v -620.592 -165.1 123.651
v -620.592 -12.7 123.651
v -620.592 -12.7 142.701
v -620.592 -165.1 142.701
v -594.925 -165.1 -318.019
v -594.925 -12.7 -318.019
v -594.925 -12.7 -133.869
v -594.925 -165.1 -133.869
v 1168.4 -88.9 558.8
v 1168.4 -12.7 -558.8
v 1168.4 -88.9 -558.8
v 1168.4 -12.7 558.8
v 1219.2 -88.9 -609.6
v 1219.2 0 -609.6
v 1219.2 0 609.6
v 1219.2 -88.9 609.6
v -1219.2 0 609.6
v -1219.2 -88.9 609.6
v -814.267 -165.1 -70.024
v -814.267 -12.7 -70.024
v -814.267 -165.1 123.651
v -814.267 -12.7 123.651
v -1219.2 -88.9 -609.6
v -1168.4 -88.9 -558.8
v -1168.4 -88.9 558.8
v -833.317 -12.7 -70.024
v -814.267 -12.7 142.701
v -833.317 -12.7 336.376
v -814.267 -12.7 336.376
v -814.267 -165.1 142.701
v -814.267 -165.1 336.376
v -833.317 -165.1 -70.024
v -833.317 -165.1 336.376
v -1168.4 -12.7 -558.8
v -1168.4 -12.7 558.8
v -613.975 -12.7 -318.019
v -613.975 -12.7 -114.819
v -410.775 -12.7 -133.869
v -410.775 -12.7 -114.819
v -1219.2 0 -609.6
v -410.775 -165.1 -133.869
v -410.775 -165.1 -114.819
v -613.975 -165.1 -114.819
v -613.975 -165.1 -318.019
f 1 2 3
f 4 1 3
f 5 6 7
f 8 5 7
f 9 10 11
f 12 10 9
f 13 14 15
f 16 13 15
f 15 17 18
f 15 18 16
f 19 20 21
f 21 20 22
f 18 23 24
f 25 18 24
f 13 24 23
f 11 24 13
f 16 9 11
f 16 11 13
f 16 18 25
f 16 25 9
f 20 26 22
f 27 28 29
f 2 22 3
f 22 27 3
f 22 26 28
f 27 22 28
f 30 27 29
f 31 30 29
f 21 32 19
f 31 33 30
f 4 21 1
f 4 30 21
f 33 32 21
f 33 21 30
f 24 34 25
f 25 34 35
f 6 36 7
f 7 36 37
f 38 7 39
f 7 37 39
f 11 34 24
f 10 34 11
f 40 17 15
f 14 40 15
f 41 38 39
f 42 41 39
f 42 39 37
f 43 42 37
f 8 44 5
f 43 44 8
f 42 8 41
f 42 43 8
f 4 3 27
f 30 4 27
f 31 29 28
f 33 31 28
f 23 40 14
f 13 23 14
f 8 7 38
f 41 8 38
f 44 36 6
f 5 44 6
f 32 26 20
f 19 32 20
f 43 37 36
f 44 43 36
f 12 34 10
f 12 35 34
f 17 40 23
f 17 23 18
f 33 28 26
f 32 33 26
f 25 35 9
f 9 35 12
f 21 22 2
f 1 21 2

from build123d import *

# Parameters (mm, degrees)
F0_W     = 2438.4
F0_H     = 1219.2
F0_W_2   = 2336.8
F0_H_2   = 1117.6
F1_DEPTH = 12.7
F2_DEPTH = 88.9
F4_DEPTH = 152.4
F6_DEPTH = 152.4


with BuildPart() as f1:
    # F0 (on Front) → F1 (new body)
    with BuildSketch(Plane.XZ):
        Rectangle(F0_W, F0_H)
        Rectangle(F0_W_2, F0_H_2, mode=Mode.SUBTRACT)
        Rectangle(F0_W_2, F0_H_2)
    extrude(amount=F1_DEPTH)

    # F0 (on Front) → F2 (join)
    with BuildSketch(Plane.XZ):
        Rectangle(F0_W, F0_H)
        Rectangle(F0_W_2, F0_H_2, mode=Mode.SUBTRACT)
    extrude(amount=F2_DEPTH)


with BuildPart() as f4:
    # F3 (on face) → F4 (new body)
    with BuildSketch(Plane.XZ.offset(12.7)):
        Polygon((-814.2674711327, 336.3761521408), (-833.3174711327, 336.3761521408), (-833.3174711327, 142.7011521408), (-833.3174711327, 123.6511521408), (-833.3174711327, -70.0238478592), (-814.2674711327, -70.0238478592), (-814.2674711327, 123.6511521408), (-620.5924711327, 123.6511521408), (-620.5924711327, 142.7011521408), (-814.2674711327, 142.7011521408), align=None)
    extrude(amount=F4_DEPTH)


with BuildPart() as f6:
    # F5 (on face) → F6 (new body)
    with BuildSketch(Plane.XZ.offset(12.7)):
        Polygon((-594.9254888773, -318.0188434053), (-594.9254888773, -133.8688434053), (-410.7754888773, -133.8688434053), (-410.7754888773, -114.8188434053), (-594.9254888773, -114.8188434053), (-613.9754888773, -114.8188434053), (-613.9754888773, -133.8688434053), (-613.9754888773, -318.0188434053), align=None)
    extrude(amount=F6_DEPTH)


solid = Compound([f1.part, f4.part, f6.part])
